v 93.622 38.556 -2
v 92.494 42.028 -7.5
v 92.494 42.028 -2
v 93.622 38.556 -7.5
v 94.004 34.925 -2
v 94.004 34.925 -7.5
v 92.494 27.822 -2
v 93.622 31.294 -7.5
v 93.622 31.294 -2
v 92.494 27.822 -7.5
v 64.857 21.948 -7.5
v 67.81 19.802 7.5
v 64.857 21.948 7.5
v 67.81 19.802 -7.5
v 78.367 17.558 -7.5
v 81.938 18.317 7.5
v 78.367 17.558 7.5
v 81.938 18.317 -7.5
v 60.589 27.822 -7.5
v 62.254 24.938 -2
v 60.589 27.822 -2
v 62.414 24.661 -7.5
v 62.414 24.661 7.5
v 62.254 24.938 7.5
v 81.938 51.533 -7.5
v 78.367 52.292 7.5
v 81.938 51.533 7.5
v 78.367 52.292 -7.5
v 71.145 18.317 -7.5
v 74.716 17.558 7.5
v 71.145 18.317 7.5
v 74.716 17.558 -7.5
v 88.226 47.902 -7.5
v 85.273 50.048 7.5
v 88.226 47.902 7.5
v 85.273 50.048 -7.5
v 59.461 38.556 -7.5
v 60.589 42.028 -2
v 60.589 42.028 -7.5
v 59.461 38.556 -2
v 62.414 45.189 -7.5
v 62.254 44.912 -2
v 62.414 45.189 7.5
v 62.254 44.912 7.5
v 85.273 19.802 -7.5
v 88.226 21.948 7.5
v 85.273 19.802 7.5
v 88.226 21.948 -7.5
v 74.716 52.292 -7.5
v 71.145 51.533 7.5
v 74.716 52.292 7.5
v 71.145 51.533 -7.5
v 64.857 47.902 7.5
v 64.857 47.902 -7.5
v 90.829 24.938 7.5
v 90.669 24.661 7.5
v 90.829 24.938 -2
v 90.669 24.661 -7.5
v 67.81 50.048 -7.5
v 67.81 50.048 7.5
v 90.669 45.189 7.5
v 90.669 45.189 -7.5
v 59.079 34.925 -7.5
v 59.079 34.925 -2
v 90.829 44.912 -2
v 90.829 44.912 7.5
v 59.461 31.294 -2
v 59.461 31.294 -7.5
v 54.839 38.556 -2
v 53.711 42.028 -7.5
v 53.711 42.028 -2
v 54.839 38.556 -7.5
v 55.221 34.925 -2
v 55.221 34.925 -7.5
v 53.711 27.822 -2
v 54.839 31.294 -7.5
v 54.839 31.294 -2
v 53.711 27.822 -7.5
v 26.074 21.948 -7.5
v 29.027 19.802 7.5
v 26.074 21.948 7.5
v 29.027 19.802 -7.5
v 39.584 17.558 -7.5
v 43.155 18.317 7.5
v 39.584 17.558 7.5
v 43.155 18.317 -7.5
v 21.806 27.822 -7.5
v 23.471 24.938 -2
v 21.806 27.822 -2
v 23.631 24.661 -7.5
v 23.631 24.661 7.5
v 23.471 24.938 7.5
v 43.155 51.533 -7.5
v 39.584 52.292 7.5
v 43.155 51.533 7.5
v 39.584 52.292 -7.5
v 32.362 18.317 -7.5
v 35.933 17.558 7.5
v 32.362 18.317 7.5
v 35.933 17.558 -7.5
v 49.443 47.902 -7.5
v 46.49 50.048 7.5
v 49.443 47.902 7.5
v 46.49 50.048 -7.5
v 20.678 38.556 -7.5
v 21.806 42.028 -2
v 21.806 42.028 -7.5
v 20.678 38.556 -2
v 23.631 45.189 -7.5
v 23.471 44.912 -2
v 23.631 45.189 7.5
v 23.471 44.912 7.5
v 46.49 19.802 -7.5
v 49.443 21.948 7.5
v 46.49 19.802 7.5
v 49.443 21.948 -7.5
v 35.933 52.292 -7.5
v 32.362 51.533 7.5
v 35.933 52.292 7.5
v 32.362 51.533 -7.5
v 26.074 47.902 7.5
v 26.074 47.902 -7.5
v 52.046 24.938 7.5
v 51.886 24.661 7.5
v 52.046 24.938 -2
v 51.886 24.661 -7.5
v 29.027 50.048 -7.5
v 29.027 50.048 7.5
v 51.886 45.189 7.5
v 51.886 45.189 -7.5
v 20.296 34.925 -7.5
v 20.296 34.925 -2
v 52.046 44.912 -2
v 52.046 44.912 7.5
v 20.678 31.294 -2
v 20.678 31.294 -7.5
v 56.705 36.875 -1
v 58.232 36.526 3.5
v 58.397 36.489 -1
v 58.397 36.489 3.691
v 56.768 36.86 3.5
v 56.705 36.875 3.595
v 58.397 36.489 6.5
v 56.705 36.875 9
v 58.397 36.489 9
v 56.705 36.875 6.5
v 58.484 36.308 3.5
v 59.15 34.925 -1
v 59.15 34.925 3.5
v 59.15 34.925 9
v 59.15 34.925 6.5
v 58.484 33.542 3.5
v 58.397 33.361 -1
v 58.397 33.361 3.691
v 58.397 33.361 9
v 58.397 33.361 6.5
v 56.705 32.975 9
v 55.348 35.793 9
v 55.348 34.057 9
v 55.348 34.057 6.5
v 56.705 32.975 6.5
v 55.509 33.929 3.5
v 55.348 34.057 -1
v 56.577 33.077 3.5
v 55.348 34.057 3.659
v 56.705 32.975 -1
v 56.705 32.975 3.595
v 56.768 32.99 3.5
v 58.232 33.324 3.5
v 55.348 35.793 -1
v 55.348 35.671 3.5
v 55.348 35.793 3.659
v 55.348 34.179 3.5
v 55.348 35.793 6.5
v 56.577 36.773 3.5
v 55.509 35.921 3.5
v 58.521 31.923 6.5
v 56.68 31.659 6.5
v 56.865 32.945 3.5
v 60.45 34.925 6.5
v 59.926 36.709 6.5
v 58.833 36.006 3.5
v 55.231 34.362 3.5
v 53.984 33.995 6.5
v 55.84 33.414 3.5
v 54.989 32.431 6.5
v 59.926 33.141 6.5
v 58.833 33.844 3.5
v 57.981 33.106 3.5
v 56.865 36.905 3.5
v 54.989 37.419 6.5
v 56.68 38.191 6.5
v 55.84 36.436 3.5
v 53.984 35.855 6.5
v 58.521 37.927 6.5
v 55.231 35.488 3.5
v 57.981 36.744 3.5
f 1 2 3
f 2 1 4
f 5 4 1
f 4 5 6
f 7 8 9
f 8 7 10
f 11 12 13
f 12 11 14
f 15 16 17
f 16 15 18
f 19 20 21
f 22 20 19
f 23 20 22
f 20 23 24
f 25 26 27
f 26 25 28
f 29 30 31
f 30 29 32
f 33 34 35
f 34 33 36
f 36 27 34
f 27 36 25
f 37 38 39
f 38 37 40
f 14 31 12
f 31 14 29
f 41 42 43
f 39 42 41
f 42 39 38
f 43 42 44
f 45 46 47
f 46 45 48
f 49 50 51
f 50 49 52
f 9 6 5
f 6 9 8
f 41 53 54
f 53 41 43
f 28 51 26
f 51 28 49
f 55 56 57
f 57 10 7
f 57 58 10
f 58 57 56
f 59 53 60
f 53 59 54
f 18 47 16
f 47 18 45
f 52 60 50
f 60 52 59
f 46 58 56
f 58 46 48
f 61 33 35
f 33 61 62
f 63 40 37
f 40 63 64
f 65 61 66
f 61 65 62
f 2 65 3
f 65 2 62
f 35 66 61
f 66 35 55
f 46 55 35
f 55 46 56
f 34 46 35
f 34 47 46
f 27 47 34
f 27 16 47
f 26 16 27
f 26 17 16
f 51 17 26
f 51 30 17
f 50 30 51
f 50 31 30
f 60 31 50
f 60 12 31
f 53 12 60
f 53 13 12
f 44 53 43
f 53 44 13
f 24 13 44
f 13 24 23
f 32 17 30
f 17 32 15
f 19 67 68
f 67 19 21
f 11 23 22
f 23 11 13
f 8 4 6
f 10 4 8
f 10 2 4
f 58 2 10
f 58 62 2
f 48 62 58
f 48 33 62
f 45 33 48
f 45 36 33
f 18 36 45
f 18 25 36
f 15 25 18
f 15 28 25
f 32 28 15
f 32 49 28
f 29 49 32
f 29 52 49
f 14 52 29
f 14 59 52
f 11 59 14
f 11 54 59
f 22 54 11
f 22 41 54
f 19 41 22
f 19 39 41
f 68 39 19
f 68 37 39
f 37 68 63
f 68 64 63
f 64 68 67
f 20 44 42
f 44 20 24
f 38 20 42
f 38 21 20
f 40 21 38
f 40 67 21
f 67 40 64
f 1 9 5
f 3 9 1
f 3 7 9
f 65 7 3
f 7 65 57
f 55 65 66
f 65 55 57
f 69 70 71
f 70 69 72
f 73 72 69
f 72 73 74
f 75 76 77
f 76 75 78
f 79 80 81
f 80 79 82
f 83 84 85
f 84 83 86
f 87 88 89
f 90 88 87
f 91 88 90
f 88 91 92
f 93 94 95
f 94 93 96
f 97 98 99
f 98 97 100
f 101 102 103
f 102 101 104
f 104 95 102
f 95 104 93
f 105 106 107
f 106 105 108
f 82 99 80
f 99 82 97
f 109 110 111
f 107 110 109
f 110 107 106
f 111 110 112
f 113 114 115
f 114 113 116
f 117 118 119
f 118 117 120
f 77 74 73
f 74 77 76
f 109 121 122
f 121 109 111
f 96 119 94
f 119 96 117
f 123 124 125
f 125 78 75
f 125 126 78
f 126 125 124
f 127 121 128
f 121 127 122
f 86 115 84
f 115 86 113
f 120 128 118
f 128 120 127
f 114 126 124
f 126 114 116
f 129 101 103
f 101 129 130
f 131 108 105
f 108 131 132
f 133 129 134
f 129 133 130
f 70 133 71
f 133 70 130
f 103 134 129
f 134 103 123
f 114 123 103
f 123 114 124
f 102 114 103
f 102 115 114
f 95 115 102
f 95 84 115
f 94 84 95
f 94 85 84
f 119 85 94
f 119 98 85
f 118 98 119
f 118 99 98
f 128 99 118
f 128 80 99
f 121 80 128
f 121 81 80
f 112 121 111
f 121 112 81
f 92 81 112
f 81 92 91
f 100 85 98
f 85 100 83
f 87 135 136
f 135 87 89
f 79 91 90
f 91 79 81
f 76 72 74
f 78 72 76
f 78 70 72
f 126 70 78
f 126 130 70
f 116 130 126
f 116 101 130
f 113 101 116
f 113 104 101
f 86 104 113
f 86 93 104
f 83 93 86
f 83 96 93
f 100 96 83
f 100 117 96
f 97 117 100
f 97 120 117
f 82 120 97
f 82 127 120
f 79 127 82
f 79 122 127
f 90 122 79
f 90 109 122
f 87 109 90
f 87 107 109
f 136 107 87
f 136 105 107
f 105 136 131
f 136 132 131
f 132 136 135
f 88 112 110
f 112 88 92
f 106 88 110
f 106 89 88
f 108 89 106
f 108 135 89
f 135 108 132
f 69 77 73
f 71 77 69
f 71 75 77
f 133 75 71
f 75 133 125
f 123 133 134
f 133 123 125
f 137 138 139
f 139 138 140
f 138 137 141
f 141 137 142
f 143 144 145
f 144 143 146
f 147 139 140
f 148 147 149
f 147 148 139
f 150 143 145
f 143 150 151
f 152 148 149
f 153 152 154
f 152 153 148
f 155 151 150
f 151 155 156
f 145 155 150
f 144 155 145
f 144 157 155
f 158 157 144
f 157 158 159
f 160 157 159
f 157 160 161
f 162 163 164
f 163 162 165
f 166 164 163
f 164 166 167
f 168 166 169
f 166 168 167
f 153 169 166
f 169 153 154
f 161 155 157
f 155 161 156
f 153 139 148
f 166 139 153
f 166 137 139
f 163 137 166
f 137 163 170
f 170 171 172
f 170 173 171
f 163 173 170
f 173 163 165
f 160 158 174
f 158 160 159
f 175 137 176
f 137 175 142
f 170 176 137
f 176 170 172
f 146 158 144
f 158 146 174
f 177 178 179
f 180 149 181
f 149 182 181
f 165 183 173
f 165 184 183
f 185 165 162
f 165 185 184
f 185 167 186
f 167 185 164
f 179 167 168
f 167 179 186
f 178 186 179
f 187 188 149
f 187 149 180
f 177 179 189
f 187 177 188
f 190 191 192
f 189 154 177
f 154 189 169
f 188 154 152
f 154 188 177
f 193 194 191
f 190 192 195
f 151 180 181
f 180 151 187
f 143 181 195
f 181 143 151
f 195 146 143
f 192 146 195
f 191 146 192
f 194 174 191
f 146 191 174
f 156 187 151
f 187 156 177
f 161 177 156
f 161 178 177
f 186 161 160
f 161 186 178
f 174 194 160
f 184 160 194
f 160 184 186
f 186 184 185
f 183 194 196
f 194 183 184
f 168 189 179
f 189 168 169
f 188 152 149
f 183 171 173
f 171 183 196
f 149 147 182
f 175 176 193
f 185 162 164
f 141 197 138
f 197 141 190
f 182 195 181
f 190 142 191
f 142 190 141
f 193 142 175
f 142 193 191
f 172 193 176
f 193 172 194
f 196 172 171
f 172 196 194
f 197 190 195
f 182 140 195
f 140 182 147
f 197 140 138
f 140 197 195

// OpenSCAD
// The dimentions are from the model made at TheNewHobbyist at
//      https://www.printables.com/model/72079-wally-wall-plate-customizer


//TODO: Comment to TheNewHobbyist about the 'go away Customizer' comment

1st_plate = "keystone1";

1st_plate_bottom_hole = "outlet";


l_offset = [34.925,39.6875,44.45];
r_offset = [34.925,39.6875,44.45];



// Bigger hole in your wall? Try this
plate_size = 0; // [0:Standard, 1:Junior-Jumbo, 2:Jumbo]

height_sizes = [114.3,123.825,133.35];

height = 114.3; //plate height (static)


plate1();//1st_plate = 1st_plate,            1st_plate_bottom_hole = 1st_plate_bottom_hole);

// plate1_solid(1st_plate = 1st_plate,
//              1st_plate_bottom_hole = 1st_plate_bottom_hole);

module plate1_solid()
{
    if (1st_plate == "keystone1" && 1st_plate_bottom_hole == "none") {
        translate([height_sizes[plate_size]/2 + 14.3,l_offset[plate_size] - 11.5,-3.9]) hole("keystone_solid");
        }
    else if (1st_plate == "keystone1" && 1st_plate_bottom_hole != "outlet" && 1st_plate_bottom_hole != "toggle" && 1st_plate_bottom_hole != "rocker") 
    {
        translate([height_sizes[plate_size]/2,l_offset[plate_size] - 11.5,-3.9]) hole("keystone_solid");
    }
    if (1st_plate_bottom_hole == "keystone1" && 1st_plate == "none") {
        translate([height_sizes[plate_size]/2 + 14.3,l_offset[plate_size] - 11.5,-3.9]) hole("keystone_solid");
        }
    else if (1st_plate_bottom_hole == "keystone1" && 1st_plate != "outlet" && 1st_plate != "toggle" && 1st_plate != "rocker") {
        translate([height_sizes[plate_size]/2 + 28.5,l_offset[plate_size] - 11.5,-3.9]) hole("keystone_solid");
	}
}



module outletCutout()
{
    hole_type = "outlet";


    // Duplex power outlet plate or dual side toggles
    if (hole_type == "outlet" || hole_type == "dualsidetoggle") 
    {
            translate([height_sizes[plate_size]/2 + 19.3915,0,0]) 
            {
                difference() {
                    cylinder(r=17.4625, h=15, center = true);
                    translate([-24.2875,-15,-2]) cube([10,37,15], center = false);
                    translate([14.2875,-15,-2]) cube([10,37,15], center = false);
                                    }
                                
            }
            
            translate([height_sizes[plate_size]/2 - 19.3915,0,0])
            {
                difference(){
                    cylinder(r=17.4625, h=15, center = true);
                    translate([-24.2875,-15,-2]) cube([10,37,15], center = false);
                    translate([14.2875,-15,-2]) cube([10,37,15], center = false);
                                    }
            }
            
            translate([height_sizes[plate_size]/2,0,-1]) cylinder(r=2, h=10);
            translate([height_sizes[plate_size]/2,0,3.5]) cylinder(r1=2, r2=3.3, h=3);                    
    }
}




module plate1(){
	if (1st_plate == "toggle" || 1st_plate_bottom_hole == "toggle"){
		translate([0,l_offset[plate_size],0]) toggle_screws();
		translate([0,l_offset[plate_size],0]) hole("toggle");
		}
	else if (1st_plate == "long_toggle" || 1st_plate_bottom_hole == "long_toggle"){
		translate([0,l_offset[plate_size],0]) toggle_screws();
		translate([0,l_offset[plate_size],0]) hole("long_toggle");
		}
	else if (1st_plate == "rocker" || 1st_plate_bottom_hole == "rocker"){
		translate([0,l_offset[plate_size],0]) rocker_screws();
		translate([0,l_offset[plate_size],0]) hole("rocker");
		}
	else if (1st_plate == "outlet" || 1st_plate_bottom_hole == "outlet") {
	translate([0,l_offset[plate_size],0]) hole("outlet");
	}
	else if (1st_plate_bottom_hole == "none") {
		translate([0,l_offset[plate_size],0]) box_screws();
		translate([positions[0],l_offset[plate_size],0]) hole(1st_plate);
			}
	else if (1st_plate == "none") {
		translate([0,l_offset[plate_size],0]) box_screws();
		translate([positions[0],l_offset[plate_size],0]) hole(1st_plate_bottom_hole);
			}
	else {
	translate([0,l_offset[plate_size],0]) box_screws();
	translate([positions[1],l_offset[plate_size],0]) hole(1st_plate);
	translate([positions[2],l_offset[plate_size],0]) hole(1st_plate_bottom_hole);
	}
}





// remove the other stuff
// Hole Cutout definitions
module hole(hole_type) 
{
    echo("hole-1");

// Toggle switch hole
	if (hole_type == "toggle") {
		translate([height_sizes[plate_size]/2,0,0]) cube([23.8125,10.3188,15], center = true);
		 						}

// Toggle switch hole and screw holes
	if (hole_type == "long_toggle") {
		translate([height_sizes[plate_size]/2,0,0]) cube([43.6563,11.9063,15], center = true);
		 						}

// Rocker switch plate
	if (hole_type == "rocker") {
		translate([height_sizes[plate_size]/2,0,0]) cube([67.1,33.3,15], center = true);

		 						}

// Duplex power outlet plate or dual side toggles
	if (hole_type == "outlet" || hole_type == "dualsidetoggle") {
		translate([height_sizes[plate_size]/2 + 19.3915,0,0]) {
			difference() {
				cylinder(r=17.4625, h=15, center = true);
				translate([-24.2875,-15,-2]) cube([10,37,15], center = false);
				translate([14.2875,-15,-2]) cube([10,37,15], center = false);
								}
							}
		translate([height_sizes[plate_size]/2 - 19.3915,0,0]){
			difference(){
				cylinder(r=17.4625, h=15, center = true);
				translate([-24.2875,-15,-2]) cube([10,37,15], center = false);
				translate([14.2875,-15,-2]) cube([10,37,15], center = false);
								}
							}
		translate([height_sizes[plate_size]/2,0,-1]) cylinder(r=2, h=10);
		translate([height_sizes[plate_size]/2,0,3.5]) cylinder(r1=2, r2=3.3, h=3);
							}

// Blank plate
	if (hole_type == "blank") { }

// VGA & DB09 plate
// VGA Fits http://www.datapro.net/products/vga-dual-panel-mount-f-f-cable.html
// DB09 Fits http://www.datapro.net/products/db9-serial-panel-mount-male-extension.html
	if (hole_type == "vga" || hole_type == "db09") {

			translate([0,-12.5,3]) cylinder(r=1.75, h=10, center = true);
			translate([0,12.5,3]) cylinder(r=1.75, h=10, center = true);
				difference(){
					cube([10,19,13], center=true);
					translate([-5,-9.2,1]) rotate([0,0,-35.6]) cube([4.4,2.4,15], center=true);
					translate([.9,-11.2,0]) rotate([0,0,9.6]) cube([10,4.8,15], center=true);
					translate([4.6,-8.5,0]) rotate([0,0,37.2]) cube([4.4,2.4,15], center=true);
					translate([-5,9.2,1]) rotate([0,0,35.6]) cube([4.4,2.4,15], center=true);
					translate([0.9,11.2,0]) rotate([0,0,-9.6]) cube([10,4.8,15], center=true);
					translate([4.6,8.5,0]) rotate([0,0,-37.2]) cube([4.4,2.4,15], center=true);
								}
						}

// HDMI plate
// Fits http://www.datapro.net/products/hdmi-panel-mount-extension-cable.html
	if (hole_type == "hdmi") {
		translate([0,-13,3]) cylinder(r=1.75, h=10, center = true);
		translate([0,13,3]) cylinder(r=1.75, h=10, center = true);
		translate([0,0,3]) cube([6,16,10], center=true);
							}

// DVI-I plate
// Fits http://www.datapro.net/products/dvi-i-panel-mount-extension-cable.html
	if (hole_type == "dvi") {
		translate([0,-16,3]) cylinder(r=1.75, h=10, center = true);
		translate([0,16,3]) cylinder(r=1.75, h=10, center = true);
		translate([0,0,3]) cube([10,26,10], center=true);
							}

// DisplayPort plate
// Fits http://www.datapro.net/products/dvi-i-panel-mount-extension-cable.html
	if (hole_type == "displayport") {
		translate([0,-13.5,3]) cylinder(r=1.75, h=10, center = true);
		translate([0,13.5,3]) cylinder(r=1.75, h=10, center = true);
		translate([0,0,0]){
			difference(){
				translate([0,0,3]) cube([7,19,10], center=true);
				translate([2.47,-9.37,3]) rotate([0,0,-54.6]) cube([3,5,14], center=true);
						}
								}
									}

// USB-A Plate
// Fits http://www.datapro.net/products/usb-panel-mount-type-a-cable.html
	if (hole_type == "usb-a") {
		translate([0,-15,3]) cylinder(r=1.75, h=10, center = true);
		translate([0,15,3]) cylinder(r=1.75, h=10, center = true);
		translate([0,0,3]) cube([8,16,10], center=true);
							}

// USB-B Plate
// Fits http://www.datapro.net/products/usb-panel-mount-type-b-cable.html
	if (hole_type == "usb-b") {
		translate([0,-13,3]) cylinder(r=1.75, h=10, center = true);
		translate([0,13,3]) cylinder(r=1.75, h=10, center = true);
		translate([0,0,3]) cube([11,12,10], center=true);
							}

// 1394 Firewire Plate
// Fits http://www.datapro.net/products/firewire-panel-mount-extension.html
	if (hole_type == "firewire") {
		translate([0,-13.5,3]) cylinder(r=1.75, h=10, center = true);
		translate([0,13.5,3]) cylinder(r=1.75, h=10, center = true);
		translate([0,0,3]) cube([7,12,10], center=true);
							}

// F-Type / Cable TV Plate
// Fits http://www.datapro.net/products/f-type-panel-mounting-coupler.html
	if (hole_type == "f-type") {
		translate([0,0,3]) cylinder(r=4.7625, h=10, center=true);
							}

// Cat5e & Gat6 plate
// Cat5e Fits http://www.datapro.net/products/cat-5e-panel-mount-ethernet.html
// Cat6 Fits hhttp://www.datapro.net/products/cat-6-panel-mount-ethernet.html
	if (hole_type == "cat5e" || hole_type == "cat6") {
		translate([0,-12.5,3]) cylinder(r=1.75, h=10, center = true);
		translate([0,12.5,3]) cylinder(r=1.75, h=10, center = true);
		translate([0,0,3]) cube([15,15,10], center=true);
		}

// S-Video & PS2 plate
// S-Video Fits hhttp://www.datapro.net/products/cat-6-panel-mount-ethernet.html
// PS2 http://www.datapro.net/products/ps2-panel-mount-extension-cable.html
	if (hole_type == "svideo" || hole_type == "ps2") {
		translate([0,-10,3]) cylinder(r=1.75, h=10, center = true);
		translate([0,10,3]) cylinder(r=1.75, h=10, center = true);
		translate([0,0,3]) cylinder(r=5, h=10, center=true);
		}


// Stereo / 1/4" headphone jack coupler
// Stereo coupler Fits http://www.datapro.net/products/stereo-panel-mount-coupler.html
	if (hole_type == "stereo") {
		translate([0,0,3]) cylinder(r=2.985, h=10, center=true);
		}

//Keystone1 hole
//Hole for 1 Keystone Jack
	if (hole_type == "keystone1") {
		translate([0,0,5]) cube([16.5,15,10], center = true);
	}

//Keystone Solid
	if (hole_type == "keystone_solid") {
		rotate([0,0,90]) {
			difference(){
				translate([0,0,.1]) cube([23,30.5,9.8]);
					translate([4,4,0]){
						difference(){
							cube([15,22.5,10]);
							translate([-1,-0.001,3.501]) cube([17,2,6.5]);
							translate([-1,2.5,-3.40970]) rotate([45,0,0]) cube([17,2,6.5]);
							translate([-1,18.501,6.001]) cube([17,4,4]);
							translate([-1,20.5,0]) rotate([-45,0,0]) cube([17,2,6.5]);
						}
					}
				}
			}
		}

//End of module "hole"
}
